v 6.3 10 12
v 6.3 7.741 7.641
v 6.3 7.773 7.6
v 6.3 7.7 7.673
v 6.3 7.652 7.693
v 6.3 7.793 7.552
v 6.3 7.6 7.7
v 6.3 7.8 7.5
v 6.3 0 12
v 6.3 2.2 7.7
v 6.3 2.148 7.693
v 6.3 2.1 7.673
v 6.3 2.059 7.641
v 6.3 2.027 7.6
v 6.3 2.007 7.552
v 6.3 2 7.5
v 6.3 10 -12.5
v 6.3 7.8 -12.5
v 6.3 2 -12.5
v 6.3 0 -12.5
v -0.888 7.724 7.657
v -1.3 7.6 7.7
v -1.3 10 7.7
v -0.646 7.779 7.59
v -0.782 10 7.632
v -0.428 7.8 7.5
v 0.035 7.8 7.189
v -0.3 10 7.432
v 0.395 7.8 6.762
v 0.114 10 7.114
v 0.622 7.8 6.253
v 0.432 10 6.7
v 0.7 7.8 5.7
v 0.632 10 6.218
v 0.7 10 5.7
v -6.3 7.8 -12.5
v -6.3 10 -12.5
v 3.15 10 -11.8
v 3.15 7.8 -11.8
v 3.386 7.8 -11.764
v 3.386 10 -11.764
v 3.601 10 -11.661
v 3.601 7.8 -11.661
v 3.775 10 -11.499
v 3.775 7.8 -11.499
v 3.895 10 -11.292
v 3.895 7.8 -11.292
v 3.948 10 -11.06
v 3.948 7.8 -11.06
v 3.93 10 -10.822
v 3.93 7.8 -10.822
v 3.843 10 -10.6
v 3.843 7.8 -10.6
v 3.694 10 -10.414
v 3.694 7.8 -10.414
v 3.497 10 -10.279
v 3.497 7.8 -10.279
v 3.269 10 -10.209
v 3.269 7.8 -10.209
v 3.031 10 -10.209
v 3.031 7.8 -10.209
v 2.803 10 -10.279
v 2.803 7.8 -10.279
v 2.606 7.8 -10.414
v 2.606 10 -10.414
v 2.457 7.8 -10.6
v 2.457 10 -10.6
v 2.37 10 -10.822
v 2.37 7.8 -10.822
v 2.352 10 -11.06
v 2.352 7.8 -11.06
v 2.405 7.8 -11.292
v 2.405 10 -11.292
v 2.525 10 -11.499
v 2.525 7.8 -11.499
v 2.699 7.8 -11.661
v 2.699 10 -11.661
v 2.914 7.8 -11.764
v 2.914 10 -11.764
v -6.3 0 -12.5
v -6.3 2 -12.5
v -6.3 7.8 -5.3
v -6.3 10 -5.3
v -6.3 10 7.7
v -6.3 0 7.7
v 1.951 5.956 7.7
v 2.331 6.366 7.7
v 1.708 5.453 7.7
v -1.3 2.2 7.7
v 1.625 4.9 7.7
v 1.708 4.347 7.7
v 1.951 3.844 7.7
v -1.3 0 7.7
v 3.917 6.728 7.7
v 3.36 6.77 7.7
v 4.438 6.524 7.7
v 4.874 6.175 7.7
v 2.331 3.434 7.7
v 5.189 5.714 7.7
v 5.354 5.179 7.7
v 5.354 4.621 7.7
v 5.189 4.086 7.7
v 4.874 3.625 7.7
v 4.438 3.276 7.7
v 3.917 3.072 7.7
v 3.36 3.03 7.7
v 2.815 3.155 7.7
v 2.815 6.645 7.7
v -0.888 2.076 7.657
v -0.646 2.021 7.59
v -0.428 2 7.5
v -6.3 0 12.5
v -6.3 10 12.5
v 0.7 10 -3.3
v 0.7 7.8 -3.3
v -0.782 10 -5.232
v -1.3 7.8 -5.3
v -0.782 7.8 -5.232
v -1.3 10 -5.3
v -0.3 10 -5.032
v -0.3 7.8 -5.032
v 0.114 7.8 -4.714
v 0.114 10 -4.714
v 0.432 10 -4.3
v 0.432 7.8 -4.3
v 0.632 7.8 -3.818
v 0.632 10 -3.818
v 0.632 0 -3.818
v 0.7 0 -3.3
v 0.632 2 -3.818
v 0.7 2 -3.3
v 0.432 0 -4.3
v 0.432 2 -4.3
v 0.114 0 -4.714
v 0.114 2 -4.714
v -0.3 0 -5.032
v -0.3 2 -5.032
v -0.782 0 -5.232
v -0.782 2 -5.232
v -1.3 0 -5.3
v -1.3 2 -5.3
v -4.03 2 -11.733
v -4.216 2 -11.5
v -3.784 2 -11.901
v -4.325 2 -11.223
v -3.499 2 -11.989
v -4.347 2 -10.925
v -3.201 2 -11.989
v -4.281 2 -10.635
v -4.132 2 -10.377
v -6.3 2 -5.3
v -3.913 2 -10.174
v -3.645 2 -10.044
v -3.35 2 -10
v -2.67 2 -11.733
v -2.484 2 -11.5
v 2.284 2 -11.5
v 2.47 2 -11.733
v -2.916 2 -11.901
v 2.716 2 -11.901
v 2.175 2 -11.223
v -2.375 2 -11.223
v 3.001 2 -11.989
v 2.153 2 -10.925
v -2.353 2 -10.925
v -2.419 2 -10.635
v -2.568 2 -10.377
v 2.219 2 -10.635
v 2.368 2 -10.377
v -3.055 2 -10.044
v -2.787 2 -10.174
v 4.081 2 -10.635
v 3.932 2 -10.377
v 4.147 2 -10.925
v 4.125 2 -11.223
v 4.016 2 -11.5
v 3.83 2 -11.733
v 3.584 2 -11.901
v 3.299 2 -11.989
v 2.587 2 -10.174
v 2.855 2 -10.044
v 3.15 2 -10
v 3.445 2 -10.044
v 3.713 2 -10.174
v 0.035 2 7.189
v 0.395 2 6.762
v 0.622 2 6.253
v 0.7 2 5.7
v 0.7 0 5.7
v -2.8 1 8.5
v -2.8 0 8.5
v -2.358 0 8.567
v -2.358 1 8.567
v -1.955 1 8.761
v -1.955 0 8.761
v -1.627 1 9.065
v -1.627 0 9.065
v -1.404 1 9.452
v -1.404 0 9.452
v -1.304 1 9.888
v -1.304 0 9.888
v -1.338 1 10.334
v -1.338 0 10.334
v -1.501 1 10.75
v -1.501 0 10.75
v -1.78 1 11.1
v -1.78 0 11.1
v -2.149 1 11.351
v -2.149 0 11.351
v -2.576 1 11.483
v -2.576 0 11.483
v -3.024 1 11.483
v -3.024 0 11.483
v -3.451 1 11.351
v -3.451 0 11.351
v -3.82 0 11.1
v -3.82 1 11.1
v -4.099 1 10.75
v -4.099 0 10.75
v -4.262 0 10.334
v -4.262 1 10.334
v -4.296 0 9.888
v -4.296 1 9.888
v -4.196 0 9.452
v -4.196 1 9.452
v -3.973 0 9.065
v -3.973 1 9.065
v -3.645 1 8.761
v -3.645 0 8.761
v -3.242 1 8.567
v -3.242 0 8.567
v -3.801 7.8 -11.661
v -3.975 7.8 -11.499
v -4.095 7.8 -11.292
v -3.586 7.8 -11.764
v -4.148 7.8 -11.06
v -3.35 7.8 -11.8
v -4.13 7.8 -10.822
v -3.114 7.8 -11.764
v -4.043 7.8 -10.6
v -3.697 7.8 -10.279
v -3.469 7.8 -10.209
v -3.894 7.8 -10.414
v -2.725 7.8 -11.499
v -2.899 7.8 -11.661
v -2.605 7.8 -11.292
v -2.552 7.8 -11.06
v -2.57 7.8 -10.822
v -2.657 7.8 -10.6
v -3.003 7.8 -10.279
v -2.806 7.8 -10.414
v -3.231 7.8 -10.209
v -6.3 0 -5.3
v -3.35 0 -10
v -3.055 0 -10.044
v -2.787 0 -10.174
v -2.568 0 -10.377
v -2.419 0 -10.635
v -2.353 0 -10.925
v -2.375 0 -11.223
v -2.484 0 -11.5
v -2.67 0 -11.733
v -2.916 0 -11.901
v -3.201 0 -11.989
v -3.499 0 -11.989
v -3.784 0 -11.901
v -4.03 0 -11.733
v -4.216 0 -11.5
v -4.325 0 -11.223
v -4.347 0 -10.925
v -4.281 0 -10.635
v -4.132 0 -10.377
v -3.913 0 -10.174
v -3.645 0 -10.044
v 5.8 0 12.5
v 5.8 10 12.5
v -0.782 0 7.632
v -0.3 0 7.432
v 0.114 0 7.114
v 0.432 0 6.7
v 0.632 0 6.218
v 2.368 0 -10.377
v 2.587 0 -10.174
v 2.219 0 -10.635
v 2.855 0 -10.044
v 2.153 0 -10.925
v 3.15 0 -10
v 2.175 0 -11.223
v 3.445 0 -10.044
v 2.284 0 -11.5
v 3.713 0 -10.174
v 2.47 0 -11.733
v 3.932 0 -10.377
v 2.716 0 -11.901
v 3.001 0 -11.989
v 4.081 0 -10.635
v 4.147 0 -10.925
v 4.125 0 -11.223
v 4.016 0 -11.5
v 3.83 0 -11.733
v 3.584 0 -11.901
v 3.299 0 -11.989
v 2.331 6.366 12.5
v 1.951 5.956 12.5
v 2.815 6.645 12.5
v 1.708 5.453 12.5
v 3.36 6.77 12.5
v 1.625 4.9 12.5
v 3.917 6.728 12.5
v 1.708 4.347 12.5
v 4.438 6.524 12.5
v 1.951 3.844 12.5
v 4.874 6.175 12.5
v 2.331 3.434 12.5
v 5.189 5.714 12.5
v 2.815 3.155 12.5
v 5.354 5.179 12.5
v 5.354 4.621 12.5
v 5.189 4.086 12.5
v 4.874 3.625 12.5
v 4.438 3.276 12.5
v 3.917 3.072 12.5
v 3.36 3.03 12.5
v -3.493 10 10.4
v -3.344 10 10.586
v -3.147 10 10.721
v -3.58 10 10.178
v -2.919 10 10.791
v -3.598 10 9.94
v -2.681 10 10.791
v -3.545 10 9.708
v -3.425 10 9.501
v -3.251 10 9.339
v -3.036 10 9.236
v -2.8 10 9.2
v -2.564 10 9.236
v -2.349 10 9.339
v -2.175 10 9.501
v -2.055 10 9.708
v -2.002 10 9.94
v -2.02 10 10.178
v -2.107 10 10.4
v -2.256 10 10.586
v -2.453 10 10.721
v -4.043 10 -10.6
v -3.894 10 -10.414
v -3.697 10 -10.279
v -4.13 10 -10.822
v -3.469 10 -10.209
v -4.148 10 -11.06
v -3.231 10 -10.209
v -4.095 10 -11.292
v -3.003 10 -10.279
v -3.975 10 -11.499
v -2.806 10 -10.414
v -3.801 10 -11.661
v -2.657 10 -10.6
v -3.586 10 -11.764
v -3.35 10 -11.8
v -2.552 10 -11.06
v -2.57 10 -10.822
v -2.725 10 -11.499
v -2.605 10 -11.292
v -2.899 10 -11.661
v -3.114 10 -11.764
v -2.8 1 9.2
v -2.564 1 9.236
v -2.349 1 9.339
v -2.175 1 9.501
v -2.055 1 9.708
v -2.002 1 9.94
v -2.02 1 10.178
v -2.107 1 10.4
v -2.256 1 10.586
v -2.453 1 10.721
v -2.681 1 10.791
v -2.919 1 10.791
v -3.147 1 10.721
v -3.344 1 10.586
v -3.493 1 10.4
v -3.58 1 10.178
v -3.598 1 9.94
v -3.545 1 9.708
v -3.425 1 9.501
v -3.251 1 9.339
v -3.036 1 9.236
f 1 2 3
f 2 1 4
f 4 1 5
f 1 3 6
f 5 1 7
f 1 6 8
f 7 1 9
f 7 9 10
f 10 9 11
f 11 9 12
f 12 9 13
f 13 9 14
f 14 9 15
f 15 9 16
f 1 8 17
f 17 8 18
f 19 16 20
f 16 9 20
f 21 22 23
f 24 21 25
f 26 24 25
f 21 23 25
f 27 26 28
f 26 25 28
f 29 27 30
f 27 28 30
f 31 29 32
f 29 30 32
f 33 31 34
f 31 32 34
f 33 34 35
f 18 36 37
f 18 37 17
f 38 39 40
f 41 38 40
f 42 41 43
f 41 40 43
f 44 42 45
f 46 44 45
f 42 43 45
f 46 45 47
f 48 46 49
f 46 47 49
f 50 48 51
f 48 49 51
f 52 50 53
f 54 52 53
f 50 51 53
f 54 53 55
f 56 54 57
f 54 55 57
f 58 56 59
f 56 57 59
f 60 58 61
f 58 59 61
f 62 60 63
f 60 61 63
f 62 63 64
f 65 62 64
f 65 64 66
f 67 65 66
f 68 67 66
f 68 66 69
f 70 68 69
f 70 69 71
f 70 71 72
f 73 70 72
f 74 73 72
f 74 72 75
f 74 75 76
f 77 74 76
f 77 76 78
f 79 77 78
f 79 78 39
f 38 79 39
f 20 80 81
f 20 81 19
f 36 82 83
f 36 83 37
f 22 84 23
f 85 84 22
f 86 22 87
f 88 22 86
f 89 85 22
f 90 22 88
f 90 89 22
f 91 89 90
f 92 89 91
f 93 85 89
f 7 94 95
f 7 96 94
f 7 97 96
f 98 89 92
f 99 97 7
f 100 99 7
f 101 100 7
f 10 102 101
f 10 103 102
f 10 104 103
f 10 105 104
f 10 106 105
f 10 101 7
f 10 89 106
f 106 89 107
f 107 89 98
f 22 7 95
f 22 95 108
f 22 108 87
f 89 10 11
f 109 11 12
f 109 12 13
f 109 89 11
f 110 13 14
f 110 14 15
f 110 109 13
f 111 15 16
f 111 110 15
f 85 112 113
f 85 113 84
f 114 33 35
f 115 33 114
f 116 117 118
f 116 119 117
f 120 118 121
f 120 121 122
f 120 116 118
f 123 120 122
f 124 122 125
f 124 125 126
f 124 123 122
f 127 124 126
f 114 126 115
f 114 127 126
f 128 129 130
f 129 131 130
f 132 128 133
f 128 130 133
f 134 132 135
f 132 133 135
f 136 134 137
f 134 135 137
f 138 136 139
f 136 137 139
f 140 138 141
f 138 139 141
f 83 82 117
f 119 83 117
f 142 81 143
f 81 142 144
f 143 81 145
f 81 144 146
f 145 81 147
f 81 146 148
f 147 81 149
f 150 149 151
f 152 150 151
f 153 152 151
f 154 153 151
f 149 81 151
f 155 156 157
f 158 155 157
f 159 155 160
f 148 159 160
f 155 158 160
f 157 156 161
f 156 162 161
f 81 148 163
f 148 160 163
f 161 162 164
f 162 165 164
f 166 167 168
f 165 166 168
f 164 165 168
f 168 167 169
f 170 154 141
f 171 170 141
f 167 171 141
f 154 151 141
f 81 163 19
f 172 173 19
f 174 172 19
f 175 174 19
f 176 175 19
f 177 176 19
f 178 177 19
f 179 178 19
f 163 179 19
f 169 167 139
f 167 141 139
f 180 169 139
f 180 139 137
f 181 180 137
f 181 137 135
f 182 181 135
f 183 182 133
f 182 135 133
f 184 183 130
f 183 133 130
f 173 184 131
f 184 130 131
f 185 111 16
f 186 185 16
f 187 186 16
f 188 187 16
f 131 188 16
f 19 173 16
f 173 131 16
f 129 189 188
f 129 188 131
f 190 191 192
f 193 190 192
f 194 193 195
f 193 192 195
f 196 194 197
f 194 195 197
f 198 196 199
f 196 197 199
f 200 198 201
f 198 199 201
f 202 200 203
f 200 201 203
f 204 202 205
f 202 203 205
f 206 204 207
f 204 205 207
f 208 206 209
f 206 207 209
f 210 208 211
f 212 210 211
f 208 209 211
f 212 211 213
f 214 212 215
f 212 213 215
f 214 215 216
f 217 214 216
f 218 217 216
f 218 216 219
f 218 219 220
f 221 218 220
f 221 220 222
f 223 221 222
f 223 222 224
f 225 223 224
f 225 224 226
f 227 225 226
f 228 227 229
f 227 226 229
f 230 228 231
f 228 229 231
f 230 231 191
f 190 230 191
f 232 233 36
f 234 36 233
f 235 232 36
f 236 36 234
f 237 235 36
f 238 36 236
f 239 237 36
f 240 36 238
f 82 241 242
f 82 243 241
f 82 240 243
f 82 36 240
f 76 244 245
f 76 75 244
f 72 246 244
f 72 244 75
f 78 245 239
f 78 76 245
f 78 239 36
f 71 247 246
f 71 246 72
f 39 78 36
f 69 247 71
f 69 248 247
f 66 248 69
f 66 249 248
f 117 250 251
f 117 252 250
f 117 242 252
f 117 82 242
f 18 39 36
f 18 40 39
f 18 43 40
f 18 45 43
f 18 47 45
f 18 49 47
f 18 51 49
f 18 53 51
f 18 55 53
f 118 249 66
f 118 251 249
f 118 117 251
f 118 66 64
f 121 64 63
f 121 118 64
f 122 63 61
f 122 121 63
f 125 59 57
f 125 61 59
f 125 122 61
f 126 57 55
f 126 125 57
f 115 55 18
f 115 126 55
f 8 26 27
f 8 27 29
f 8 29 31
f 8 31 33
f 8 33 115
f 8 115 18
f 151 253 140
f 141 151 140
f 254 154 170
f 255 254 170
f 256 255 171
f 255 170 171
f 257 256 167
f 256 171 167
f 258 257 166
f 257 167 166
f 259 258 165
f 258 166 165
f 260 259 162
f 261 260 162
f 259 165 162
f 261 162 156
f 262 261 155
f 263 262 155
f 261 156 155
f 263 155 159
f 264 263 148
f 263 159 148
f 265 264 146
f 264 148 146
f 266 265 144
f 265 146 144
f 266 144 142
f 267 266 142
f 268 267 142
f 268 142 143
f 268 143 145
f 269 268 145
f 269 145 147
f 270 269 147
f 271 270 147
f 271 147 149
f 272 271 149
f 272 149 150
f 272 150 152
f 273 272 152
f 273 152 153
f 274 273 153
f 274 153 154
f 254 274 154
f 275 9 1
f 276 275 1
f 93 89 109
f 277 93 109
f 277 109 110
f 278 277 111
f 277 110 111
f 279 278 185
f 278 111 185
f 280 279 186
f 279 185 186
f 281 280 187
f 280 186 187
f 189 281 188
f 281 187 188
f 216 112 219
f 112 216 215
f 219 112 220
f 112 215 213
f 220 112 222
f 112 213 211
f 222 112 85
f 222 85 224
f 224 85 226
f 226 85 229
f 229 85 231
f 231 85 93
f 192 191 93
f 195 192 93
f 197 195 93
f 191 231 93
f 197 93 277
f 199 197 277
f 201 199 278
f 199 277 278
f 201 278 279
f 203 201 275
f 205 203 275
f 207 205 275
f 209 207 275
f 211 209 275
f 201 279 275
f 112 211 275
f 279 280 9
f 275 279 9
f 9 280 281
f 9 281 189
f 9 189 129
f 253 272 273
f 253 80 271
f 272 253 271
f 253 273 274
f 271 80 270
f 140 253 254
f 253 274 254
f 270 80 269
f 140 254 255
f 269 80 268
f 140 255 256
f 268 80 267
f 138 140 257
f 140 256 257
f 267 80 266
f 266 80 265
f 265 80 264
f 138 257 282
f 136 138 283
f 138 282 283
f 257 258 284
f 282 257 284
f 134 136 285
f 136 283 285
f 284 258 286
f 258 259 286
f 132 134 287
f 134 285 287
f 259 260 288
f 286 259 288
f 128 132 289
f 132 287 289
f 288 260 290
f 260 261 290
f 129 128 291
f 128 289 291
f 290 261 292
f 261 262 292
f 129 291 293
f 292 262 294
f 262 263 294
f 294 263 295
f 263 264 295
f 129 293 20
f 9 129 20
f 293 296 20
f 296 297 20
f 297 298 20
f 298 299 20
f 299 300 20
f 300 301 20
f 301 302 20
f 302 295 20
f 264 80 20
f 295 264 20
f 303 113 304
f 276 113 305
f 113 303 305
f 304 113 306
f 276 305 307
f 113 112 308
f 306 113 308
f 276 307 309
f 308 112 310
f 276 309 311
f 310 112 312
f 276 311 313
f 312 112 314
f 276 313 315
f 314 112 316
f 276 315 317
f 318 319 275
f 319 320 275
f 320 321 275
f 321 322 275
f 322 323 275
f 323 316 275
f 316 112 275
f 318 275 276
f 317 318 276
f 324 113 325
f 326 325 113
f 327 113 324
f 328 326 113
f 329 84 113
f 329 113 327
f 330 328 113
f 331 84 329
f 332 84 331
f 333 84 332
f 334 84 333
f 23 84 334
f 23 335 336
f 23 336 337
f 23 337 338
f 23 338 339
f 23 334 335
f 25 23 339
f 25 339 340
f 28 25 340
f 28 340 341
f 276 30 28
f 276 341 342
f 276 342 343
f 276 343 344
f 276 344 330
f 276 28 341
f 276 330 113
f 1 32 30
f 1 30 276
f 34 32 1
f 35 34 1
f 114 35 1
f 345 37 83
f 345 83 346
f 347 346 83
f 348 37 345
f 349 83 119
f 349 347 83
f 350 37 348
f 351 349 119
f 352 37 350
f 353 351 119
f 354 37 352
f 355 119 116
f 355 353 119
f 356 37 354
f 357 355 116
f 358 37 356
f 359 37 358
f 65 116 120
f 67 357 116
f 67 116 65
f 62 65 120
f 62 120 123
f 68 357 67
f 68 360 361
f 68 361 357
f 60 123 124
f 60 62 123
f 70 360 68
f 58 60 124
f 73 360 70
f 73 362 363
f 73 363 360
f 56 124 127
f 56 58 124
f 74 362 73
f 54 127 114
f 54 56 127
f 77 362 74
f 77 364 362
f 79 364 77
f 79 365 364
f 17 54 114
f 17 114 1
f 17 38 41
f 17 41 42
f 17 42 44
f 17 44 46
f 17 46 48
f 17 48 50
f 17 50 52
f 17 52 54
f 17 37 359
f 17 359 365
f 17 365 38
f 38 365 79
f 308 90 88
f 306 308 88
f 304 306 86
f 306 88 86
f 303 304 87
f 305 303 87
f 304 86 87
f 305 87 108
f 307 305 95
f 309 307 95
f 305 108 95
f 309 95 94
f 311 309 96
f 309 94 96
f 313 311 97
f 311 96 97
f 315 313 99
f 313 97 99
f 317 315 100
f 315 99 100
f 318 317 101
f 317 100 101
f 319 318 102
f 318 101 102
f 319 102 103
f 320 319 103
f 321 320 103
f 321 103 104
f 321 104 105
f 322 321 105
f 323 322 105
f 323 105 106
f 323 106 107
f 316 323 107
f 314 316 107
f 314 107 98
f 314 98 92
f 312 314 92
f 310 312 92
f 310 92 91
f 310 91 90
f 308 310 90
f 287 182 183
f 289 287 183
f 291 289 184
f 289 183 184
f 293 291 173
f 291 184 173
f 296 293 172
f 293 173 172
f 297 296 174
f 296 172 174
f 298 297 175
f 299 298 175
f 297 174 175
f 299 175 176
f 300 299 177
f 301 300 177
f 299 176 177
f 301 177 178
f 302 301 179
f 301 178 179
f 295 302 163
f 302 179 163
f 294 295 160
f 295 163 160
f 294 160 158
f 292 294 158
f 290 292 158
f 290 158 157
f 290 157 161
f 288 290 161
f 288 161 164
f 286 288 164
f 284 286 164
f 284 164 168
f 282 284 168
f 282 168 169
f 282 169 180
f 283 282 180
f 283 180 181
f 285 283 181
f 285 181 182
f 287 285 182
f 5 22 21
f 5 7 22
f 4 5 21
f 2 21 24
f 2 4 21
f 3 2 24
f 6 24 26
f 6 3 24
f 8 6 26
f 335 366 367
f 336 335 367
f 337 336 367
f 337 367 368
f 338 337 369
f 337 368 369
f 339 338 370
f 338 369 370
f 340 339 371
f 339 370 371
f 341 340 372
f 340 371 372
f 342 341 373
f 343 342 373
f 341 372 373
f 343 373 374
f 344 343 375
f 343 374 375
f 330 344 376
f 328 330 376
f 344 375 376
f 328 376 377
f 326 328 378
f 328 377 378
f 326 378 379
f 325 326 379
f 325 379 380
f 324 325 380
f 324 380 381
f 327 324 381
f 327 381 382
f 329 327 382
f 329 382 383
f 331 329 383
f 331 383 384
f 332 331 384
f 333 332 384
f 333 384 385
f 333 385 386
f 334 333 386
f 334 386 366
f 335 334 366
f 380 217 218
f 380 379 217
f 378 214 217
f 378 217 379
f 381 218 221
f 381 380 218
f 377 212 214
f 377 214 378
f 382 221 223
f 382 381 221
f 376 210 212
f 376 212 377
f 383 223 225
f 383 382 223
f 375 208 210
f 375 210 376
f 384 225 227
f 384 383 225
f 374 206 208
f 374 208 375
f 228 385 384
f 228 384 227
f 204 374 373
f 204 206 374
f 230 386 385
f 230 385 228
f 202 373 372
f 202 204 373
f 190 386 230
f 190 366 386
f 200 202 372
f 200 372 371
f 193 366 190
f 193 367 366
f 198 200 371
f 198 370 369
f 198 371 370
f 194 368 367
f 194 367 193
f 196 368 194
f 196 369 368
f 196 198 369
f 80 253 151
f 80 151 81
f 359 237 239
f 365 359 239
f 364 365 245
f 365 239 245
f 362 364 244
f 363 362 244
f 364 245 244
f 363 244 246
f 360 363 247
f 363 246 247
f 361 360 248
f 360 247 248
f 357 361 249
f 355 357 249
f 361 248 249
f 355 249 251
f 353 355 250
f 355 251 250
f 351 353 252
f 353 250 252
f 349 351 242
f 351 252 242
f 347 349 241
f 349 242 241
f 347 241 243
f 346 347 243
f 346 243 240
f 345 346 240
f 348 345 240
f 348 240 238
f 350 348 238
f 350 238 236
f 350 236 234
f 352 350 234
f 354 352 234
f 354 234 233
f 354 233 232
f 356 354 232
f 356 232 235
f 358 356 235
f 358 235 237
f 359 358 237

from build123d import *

# Parameters (mm, degrees)
SKETCH1_W                   = 12.6
SKETCH1_H                   = 25
BOSS_EXTRUDE1_DEPTH         = 10
CUT_EXTRUDE1_START          = -4.8
SKETCH2_W                   = 7
SKETCH2_H                   = 5.8
CUT_EXTRUDE1_DEPTH          = 23.853028767
SKETCH3_W                   = 20.2
SKETCH3_H                   = 5.8
CUT_EXTRUDE2_DEPTH          = 18.47140521
SKETCH6_R                   = 1
CUT_EXTRUDE5_DEPTH          = 17.122654868
TAP_DRILL_FOR_M2X0_4_TAP1_D = 1.6
CUT_EXTRUDE6_DEPTH          = 17.122654868
CUT_EXTRUDE6_DEPTH_BACK     = 17.122654868
SKETCH9_W                   = 7
SKETCH9_H                   = 13
FILLET1_R                   = 2
SKETCH4_R                   = 1.875
CUT_EXTRUDE7_DEPTH          = 24.403632197
TAP_DRILL_FOR_M2X0_4_TAP4_D = 1.6
FILLET3_R                   = 0.2
CHAMFER2_SIZE               = 0.5
SKETCH25_R                  = 1.5
CUT_EXTRUDE19_DEPTH         = 1


with BuildPart() as part:
    # Sketch1 → Boss-Extrude1 (new body)
    with BuildSketch(Plane(origin=(0, 0, 0), x_dir=(1, 0, 0), z_dir=(0, 1, 0))):
        Rectangle(SKETCH1_W, SKETCH1_H)
    extrude(amount=BOSS_EXTRUDE1_DEPTH)

    # Sketch2 → Cut-Extrude1 (cut, through all)
    with BuildSketch(Plane.XY.offset(12.5).offset(CUT_EXTRUDE1_START)):
        with Locations((-2.8, 4.9)):
            Rectangle(SKETCH2_W, SKETCH2_H)
    extrude(amount=-CUT_EXTRUDE1_DEPTH, mode=Mode.SUBTRACT)

    # Sketch3 → Cut-Extrude2 (cut, through all)
    with BuildSketch(Plane.ZY.offset(-0.7)):
        with Locations((-2.4, 4.9)):
            Rectangle(SKETCH3_W, SKETCH3_H)
    extrude(amount=-CUT_EXTRUDE2_DEPTH, mode=Mode.SUBTRACT)

    # Sketch6 → Cut-Extrude5 (cut, through all)
    with BuildSketch(Plane(origin=(0, 2, 0), x_dir=(1, 0, 0), z_dir=(0, 1, 0))):
        with Locations((3.15, 11)):
            Circle(SKETCH6_R)
        with Locations((-3.35, 11)):
            Circle(SKETCH6_R)
    extrude(amount=-CUT_EXTRUDE5_DEPTH, mode=Mode.SUBTRACT)

    # Tap Drill for M2x0.4 Tap1 (through all)
    with Locations(Plane(origin=(3.15, 10, -11), x_dir=(0, 0, 1), z_dir=(0, 1, 0))):
        with Locations((0, 0), (0, -6.5)):
            Hole(TAP_DRILL_FOR_M2X0_4_TAP1_D / 2)

    # Sketch9 → Cut-Extrude6 (cut, two sides: drawn at the far end of the back side and taken through both)
    with BuildSketch(Plane(origin=(0, 2, 0), x_dir=(1, 0, 0), z_dir=(0, 1, 0)).offset(-CUT_EXTRUDE6_DEPTH_BACK)):
        with Locations((-2.8, -1.2)):
            Rectangle(SKETCH9_W, SKETCH9_H)
    extrude(amount=CUT_EXTRUDE6_DEPTH + CUT_EXTRUDE6_DEPTH_BACK, mode=Mode.SUBTRACT)

    # Fillet1
    fillet1_edges = [part.edges().sort_by_distance(p)[0] for p in [
        (0.7, 1, -5.3),
        (0.7, 1, 7.7),
        (0.7, 8.9, -5.3),
        (0.7, 8.9, 7.7),
    ]]
    fillet(fillet1_edges, radius=FILLET1_R)

    # Sketch4 → Cut-Extrude7 (cut, through all)
    with BuildSketch(Plane(origin=(0, 0, 7.7), x_dir=(-1, 0, 0), z_dir=(0, 0, -1))):
        with Locations((-3.5, 4.9)):
            Circle(SKETCH4_R)
    extrude(amount=-CUT_EXTRUDE7_DEPTH, mode=Mode.SUBTRACT)

    # Tap Drill for M2x0.4 Tap4 (through all)
    with Locations(Plane(origin=(-2.8, 10, 10), x_dir=(0, 0, 1), z_dir=(0, 1, 0))):
        with Locations((0, 0)):
            Hole(TAP_DRILL_FOR_M2X0_4_TAP4_D / 2)

    # Fillet3
    fillet3_edges = [part.edges().sort_by_distance(p)[0] for p in [
        (2.5, 2, 7.7),
        (2.5, 7.8, 7.7),
    ]]
    fillet(fillet3_edges, radius=FILLET3_R)

    # Chamfer2
    chamfer2_edges = [part.edges().sort_by_distance(p)[0] for p in [
        (6.3, 5, 12.5),
    ]]
    chamfer(chamfer2_edges, length=CHAMFER2_SIZE)

    # Sketch25 → Cut-Extrude19 (cut)
    with BuildSketch(Plane.XZ):
        with Locations((-2.8, 10)):
            Circle(SKETCH25_R)
    extrude(amount=-CUT_EXTRUDE19_DEPTH, mode=Mode.SUBTRACT)


solid = part.part
